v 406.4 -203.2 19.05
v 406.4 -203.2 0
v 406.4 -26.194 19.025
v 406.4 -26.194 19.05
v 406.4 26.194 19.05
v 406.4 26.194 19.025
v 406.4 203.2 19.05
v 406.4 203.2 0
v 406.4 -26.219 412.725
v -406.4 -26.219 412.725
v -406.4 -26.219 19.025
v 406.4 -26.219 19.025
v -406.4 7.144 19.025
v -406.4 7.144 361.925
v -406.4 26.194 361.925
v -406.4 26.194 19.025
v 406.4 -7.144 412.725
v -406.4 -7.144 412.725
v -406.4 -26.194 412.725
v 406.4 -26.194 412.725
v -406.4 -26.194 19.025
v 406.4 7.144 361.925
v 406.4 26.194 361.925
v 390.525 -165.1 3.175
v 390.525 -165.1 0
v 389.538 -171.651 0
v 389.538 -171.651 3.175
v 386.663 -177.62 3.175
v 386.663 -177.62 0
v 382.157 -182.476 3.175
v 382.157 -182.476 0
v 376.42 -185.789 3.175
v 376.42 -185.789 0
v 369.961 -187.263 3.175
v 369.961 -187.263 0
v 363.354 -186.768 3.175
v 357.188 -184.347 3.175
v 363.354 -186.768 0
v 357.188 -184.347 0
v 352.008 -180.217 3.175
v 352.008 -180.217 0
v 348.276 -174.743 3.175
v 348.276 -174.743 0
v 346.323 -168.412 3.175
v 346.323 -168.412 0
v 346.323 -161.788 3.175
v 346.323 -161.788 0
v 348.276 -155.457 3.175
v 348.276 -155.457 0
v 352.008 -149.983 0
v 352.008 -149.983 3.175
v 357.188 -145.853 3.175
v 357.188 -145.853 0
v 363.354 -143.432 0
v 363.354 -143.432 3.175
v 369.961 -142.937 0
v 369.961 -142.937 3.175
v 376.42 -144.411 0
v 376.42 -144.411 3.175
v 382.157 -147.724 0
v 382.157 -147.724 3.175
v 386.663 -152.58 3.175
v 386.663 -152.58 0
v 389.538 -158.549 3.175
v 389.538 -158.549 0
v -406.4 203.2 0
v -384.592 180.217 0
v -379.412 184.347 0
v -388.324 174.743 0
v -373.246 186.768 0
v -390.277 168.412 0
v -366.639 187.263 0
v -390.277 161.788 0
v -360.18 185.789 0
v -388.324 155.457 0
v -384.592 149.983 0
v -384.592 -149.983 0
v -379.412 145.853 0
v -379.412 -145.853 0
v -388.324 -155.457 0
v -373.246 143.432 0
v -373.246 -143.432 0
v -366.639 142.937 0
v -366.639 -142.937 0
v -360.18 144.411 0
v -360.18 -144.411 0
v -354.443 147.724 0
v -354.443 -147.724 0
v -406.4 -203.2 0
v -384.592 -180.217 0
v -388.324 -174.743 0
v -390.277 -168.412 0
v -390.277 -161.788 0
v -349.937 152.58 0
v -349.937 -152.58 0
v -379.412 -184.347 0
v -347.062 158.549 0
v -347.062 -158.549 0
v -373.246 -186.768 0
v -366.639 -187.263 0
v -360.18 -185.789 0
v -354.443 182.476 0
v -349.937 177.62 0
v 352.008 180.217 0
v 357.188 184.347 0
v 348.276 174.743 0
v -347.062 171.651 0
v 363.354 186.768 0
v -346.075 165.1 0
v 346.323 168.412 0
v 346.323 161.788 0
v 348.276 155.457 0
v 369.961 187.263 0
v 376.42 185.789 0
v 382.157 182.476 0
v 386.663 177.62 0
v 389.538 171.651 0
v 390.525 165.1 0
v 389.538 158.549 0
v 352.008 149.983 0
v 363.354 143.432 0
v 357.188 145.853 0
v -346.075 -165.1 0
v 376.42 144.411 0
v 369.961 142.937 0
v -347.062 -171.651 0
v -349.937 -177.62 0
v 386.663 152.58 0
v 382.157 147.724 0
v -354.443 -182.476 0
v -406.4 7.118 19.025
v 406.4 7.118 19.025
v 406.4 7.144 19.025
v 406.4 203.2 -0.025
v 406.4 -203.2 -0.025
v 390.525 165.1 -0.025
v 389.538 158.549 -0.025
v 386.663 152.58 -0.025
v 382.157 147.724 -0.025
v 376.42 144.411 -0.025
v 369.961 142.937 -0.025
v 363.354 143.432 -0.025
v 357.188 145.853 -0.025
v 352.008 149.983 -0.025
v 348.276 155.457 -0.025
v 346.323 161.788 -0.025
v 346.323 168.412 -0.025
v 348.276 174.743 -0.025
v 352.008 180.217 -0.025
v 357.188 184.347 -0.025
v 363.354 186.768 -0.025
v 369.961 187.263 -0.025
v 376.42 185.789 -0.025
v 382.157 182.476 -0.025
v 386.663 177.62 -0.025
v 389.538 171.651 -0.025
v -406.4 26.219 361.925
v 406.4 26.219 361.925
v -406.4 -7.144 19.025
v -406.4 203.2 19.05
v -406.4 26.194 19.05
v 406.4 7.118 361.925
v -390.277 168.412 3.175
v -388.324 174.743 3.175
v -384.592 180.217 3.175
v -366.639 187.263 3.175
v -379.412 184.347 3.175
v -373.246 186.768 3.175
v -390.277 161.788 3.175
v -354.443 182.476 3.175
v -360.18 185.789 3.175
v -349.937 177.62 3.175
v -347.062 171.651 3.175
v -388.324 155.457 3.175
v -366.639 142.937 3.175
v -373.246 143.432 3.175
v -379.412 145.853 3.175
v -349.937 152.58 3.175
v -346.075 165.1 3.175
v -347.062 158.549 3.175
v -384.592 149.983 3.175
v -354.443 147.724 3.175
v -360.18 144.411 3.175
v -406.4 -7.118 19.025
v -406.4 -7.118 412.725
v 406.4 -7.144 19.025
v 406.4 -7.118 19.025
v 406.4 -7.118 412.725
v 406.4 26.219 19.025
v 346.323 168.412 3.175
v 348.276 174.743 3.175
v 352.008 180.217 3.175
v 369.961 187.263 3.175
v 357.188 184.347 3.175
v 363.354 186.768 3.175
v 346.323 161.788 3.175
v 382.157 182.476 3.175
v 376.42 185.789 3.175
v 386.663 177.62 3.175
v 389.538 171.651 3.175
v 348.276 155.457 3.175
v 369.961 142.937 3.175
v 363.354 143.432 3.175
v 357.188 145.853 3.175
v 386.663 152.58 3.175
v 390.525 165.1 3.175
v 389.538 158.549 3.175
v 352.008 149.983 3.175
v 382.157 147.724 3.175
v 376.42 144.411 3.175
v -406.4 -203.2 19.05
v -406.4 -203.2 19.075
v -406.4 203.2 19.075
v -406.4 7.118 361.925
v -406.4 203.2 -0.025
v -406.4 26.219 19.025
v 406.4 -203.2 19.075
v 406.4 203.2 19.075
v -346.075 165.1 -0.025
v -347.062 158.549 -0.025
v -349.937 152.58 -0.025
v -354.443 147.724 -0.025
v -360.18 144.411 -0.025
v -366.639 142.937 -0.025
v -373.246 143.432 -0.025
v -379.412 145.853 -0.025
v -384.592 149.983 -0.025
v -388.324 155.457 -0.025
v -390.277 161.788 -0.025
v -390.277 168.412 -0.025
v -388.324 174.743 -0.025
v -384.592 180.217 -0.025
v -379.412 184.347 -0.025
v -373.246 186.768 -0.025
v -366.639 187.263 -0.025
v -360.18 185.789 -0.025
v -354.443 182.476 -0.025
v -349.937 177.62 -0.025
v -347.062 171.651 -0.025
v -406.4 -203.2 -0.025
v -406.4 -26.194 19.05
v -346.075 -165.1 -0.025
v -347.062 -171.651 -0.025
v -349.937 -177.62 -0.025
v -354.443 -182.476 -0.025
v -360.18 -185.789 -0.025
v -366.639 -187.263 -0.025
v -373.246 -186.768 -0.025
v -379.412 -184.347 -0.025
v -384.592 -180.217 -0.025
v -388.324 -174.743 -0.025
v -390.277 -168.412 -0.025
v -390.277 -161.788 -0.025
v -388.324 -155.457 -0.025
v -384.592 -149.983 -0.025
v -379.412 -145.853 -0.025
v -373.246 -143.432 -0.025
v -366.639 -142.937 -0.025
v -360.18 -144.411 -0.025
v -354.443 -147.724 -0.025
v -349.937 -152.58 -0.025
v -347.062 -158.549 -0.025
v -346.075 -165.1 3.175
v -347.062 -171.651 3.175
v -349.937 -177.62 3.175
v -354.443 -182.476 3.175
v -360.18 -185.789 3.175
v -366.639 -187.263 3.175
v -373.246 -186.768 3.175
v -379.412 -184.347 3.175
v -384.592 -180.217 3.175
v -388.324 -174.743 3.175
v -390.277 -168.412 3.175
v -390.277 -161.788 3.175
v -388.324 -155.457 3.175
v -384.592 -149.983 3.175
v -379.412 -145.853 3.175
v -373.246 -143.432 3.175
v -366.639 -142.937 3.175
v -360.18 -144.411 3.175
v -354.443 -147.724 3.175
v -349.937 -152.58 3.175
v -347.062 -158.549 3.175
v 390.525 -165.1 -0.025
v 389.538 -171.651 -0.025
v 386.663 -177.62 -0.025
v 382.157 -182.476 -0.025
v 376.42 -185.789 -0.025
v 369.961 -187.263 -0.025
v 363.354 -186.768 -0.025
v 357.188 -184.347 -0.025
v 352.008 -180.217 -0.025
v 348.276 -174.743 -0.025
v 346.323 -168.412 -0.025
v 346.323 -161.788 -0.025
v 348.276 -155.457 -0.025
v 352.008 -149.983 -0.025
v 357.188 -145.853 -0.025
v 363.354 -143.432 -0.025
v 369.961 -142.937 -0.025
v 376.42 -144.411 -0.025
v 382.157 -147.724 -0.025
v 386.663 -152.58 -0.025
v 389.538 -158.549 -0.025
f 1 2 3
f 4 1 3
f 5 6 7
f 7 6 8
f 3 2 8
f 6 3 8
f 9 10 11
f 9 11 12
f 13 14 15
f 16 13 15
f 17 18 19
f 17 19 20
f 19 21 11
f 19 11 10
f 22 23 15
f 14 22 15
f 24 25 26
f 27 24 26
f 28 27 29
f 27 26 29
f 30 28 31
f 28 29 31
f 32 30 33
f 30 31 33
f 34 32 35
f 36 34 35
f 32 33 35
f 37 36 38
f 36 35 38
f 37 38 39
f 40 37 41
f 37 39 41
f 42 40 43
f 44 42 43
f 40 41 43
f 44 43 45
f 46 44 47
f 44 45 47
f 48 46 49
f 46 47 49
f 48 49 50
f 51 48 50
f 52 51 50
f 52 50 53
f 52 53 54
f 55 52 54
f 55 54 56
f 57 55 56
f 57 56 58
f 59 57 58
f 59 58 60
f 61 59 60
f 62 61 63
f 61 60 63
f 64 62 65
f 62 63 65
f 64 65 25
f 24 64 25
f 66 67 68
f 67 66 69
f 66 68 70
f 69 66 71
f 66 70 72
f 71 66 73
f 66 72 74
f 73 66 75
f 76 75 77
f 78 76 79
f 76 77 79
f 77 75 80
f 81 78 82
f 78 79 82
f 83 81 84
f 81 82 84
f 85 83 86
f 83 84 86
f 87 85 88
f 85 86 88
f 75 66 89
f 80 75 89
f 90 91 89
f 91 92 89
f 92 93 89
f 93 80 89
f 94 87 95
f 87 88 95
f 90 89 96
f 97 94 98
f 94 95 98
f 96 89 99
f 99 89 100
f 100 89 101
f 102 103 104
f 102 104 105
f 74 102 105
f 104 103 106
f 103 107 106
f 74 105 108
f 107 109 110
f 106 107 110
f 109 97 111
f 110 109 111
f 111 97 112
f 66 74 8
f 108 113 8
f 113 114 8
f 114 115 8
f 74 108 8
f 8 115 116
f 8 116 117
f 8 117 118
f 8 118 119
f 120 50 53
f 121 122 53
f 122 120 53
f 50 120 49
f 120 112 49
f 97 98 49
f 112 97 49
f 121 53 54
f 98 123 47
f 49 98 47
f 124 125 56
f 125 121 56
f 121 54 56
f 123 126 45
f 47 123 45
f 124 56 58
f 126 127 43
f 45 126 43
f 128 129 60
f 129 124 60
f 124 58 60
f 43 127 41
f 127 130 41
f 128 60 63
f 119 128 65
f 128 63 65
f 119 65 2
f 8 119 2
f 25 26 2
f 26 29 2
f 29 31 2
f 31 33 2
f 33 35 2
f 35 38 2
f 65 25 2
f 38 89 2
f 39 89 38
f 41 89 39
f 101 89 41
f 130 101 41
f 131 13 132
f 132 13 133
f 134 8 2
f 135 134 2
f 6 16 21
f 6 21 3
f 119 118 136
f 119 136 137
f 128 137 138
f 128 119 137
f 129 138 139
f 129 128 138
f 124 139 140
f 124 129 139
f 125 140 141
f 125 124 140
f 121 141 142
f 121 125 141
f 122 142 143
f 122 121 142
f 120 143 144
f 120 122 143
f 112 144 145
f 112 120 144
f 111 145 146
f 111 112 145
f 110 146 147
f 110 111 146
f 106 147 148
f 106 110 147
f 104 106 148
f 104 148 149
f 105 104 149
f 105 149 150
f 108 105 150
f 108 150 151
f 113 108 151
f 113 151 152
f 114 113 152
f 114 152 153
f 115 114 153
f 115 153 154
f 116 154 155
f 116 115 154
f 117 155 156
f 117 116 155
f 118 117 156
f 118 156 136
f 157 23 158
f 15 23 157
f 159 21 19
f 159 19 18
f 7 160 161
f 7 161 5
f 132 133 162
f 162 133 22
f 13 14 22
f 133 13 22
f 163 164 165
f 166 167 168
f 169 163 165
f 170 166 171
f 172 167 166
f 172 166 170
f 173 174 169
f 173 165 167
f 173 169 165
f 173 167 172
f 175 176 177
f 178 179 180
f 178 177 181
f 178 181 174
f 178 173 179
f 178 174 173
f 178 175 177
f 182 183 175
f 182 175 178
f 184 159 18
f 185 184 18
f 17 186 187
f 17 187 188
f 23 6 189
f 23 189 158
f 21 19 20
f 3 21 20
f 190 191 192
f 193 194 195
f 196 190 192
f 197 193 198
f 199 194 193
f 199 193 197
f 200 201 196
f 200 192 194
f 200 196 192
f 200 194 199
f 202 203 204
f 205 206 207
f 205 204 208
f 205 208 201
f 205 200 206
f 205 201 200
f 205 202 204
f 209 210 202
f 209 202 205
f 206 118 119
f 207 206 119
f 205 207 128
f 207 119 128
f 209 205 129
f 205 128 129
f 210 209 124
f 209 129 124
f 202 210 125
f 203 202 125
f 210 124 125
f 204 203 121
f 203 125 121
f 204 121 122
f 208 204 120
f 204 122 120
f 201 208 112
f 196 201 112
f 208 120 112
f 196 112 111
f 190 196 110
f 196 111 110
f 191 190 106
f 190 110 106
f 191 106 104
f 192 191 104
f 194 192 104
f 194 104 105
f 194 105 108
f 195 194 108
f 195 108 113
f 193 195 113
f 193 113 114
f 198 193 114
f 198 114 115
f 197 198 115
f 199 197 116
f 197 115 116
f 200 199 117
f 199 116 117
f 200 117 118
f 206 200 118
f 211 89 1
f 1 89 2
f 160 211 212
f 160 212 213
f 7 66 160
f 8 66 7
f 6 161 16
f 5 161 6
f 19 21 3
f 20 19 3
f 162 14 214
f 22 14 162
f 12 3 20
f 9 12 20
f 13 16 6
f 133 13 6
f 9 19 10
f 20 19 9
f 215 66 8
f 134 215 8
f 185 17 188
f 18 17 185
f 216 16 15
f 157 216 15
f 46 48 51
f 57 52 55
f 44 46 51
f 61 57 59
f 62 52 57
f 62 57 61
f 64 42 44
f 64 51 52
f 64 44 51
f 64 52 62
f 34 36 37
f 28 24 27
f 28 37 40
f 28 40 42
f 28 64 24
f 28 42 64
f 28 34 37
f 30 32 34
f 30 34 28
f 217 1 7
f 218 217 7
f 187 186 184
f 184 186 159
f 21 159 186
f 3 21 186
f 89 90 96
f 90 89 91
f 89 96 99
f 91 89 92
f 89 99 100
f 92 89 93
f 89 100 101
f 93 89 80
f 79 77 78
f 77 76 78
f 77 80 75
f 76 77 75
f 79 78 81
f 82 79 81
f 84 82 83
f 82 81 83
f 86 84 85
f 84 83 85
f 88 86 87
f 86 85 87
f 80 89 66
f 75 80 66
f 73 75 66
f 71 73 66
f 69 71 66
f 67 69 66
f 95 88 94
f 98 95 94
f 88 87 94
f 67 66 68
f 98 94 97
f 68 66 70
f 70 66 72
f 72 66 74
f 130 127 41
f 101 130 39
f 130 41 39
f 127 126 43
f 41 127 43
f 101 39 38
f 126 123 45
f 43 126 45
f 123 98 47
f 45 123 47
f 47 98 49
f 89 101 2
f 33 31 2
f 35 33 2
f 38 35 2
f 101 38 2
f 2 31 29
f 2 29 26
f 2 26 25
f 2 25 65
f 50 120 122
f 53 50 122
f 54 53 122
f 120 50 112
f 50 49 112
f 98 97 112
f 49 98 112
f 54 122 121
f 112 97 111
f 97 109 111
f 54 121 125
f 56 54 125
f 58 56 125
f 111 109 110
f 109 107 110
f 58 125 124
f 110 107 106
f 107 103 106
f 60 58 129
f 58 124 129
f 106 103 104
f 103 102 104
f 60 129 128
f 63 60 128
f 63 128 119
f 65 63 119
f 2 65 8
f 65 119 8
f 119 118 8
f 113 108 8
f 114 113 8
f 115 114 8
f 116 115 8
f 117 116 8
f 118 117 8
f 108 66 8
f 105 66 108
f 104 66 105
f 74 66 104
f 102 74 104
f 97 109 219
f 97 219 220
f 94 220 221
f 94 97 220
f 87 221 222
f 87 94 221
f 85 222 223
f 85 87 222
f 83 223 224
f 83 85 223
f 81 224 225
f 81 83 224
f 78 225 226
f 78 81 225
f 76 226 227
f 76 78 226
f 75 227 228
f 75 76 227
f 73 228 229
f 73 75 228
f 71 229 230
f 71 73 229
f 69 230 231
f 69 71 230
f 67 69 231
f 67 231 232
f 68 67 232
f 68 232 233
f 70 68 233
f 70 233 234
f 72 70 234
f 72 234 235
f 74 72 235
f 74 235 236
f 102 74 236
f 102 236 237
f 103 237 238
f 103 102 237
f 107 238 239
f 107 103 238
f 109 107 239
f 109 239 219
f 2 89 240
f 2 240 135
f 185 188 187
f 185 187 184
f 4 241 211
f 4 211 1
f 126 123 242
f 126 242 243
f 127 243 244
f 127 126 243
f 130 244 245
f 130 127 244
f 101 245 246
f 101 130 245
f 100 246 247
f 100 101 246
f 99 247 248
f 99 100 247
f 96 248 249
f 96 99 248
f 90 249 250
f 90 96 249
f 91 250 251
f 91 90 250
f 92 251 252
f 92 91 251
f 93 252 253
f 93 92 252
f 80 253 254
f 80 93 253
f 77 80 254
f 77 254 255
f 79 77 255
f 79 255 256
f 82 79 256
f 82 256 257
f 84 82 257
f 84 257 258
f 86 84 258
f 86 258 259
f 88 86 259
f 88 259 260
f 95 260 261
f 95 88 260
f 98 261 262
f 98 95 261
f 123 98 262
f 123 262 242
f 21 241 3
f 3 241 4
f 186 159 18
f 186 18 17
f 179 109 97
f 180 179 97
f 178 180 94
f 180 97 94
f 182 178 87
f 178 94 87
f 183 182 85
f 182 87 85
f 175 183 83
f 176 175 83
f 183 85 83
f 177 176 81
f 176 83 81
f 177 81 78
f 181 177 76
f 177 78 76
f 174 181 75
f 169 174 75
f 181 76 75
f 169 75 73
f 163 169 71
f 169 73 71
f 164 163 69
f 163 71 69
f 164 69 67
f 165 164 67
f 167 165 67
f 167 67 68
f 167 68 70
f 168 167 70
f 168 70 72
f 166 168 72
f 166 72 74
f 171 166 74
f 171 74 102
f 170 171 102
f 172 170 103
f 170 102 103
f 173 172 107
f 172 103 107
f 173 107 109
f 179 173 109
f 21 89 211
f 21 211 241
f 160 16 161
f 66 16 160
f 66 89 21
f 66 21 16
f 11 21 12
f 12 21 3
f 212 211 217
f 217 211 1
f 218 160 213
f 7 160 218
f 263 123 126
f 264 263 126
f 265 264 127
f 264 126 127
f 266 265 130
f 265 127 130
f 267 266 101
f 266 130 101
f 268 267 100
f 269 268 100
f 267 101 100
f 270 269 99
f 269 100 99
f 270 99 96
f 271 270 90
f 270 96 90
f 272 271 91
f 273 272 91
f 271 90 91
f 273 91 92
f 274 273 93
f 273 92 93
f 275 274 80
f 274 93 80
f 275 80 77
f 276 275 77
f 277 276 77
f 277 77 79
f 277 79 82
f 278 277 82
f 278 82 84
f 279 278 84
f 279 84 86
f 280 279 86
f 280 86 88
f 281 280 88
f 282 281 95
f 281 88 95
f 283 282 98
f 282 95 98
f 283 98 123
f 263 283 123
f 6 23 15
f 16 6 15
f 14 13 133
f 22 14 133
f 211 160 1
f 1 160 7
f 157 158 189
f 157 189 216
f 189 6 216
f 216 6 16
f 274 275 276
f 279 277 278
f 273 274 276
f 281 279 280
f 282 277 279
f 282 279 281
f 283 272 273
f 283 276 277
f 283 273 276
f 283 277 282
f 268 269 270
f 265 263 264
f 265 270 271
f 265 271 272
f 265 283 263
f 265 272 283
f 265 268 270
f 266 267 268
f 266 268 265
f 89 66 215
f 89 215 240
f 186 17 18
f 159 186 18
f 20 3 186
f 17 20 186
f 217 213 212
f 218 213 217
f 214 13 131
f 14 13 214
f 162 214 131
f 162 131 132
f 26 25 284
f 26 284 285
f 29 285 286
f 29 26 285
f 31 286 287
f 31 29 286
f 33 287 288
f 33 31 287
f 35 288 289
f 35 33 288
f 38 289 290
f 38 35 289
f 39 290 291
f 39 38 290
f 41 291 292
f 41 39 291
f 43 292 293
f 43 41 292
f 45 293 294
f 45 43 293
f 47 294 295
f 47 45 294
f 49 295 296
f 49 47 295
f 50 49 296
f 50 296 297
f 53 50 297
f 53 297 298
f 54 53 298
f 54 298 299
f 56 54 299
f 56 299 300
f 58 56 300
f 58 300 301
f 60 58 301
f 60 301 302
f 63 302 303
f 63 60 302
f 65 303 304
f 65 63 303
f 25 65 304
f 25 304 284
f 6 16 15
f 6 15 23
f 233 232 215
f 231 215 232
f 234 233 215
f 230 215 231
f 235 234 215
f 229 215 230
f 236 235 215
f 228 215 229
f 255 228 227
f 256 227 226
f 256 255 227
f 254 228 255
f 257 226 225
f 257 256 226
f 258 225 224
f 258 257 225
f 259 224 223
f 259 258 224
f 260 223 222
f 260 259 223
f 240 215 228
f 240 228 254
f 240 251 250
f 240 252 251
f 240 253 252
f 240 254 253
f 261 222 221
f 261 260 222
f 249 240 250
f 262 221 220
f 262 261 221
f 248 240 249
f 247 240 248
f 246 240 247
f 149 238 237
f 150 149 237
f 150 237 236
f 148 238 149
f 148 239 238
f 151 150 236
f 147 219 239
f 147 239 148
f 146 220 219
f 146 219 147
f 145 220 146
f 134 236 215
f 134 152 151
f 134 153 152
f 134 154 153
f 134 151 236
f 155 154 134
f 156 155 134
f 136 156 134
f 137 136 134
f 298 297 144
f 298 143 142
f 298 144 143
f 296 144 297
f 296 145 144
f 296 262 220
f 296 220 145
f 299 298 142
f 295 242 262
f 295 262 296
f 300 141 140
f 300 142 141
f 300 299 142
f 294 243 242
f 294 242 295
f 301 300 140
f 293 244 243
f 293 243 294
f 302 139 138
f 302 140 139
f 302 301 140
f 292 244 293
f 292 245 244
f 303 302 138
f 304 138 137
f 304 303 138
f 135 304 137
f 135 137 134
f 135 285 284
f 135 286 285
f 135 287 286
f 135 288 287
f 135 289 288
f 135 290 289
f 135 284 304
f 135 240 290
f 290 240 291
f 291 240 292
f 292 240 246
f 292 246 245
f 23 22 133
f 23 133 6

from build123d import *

# Parameters (mm, degrees)
F0_W      = 812.8
F0_H      = 406.4
F1_DEPTH  = 19.05
F2_W      = 812.8
F2_H      = 52.3875
F3_DEPTH  = 0.0254
F4_W      = 812.8
F4_H      = 19.05
F5_DEPTH  = 393.7
F6_W      = 812.8
F6_H      = 50.8
F7_DEPTH  = 19.05
F8_W      = 812.8
F8_H      = 342.9
F9_DEPTH  = 0.0254
F10_W     = 812.8
F10_H     = 342.9
F11_DEPTH = 0.0254
F12_W     = 812.8
F12_H     = 393.7
F13_DEPTH = 0.0254
F14_W     = 812.8
F14_H     = 393.7
F15_DEPTH = 0.0254
F16_W     = 812.8
F16_H     = 406.4
F17_DEPTH = 0.0254
F18_R     = 22.225
F19_DEPTH = 3.175
F20_W     = 812.8
F20_H     = 406.4
F20_R     = 22.225
F21_DEPTH = 0.0254


with BuildPart() as f1:
    # F0 (on Top) → F1 (new body)
    with BuildSketch(Plane.XY):
        Rectangle(F0_W, F0_H)
    extrude(amount=F1_DEPTH)

    # F2 (on face) → F3 (cut)
    with BuildSketch(Plane.XY.offset(19.05)):
        Rectangle(F2_W, F2_H)
    extrude(amount=-F3_DEPTH, mode=Mode.SUBTRACT)

    # F18 (on face) → F19 (cut)
    with BuildSketch(Plane(origin=(0, 0, 0), x_dir=(1, 0, 0), z_dir=(0, 0, -1))):
        with Locations((-368.3, 165.1)):
            Circle(F18_R)
        with Locations((-368.3, -165.1)):
            Circle(F18_R)
        with Locations((368.3, -165.1)):
            Circle(F18_R)
        with Locations((368.3, 165.1)):
            Circle(F18_R)
    extrude(amount=-F19_DEPTH, mode=Mode.SUBTRACT)


with BuildPart() as f5:
    # F4 (on face) → F5 (new body)
    with BuildSketch(Plane.XY.offset(19.0246)):
        with Locations((0, -16.66875)):
            Rectangle(F4_W, F4_H)
        with Locations((0, 16.66875)):
            Rectangle(F4_W, F4_H)
    extrude(amount=F5_DEPTH)

    # F6 (on face) → F7 (cut, through all)
    with BuildSketch(Plane(origin=(0, 26.19375, 0), x_dir=(-1, 0, 0), z_dir=(0, 1, 0))):
        with Locations((0, 387.3246)):
            Rectangle(F6_W, F6_H)
    extrude(amount=-F7_DEPTH, mode=Mode.SUBTRACT)


with BuildPart() as f9:
    # F8 (on face) → F9 (new body)
    with BuildSketch(Plane(origin=(0, 26.19375, 0), x_dir=(-1, 0, 0), z_dir=(0, 1, 0))):
        with Locations((0, 190.4746)):
            Rectangle(F8_W, F8_H)
    extrude(amount=F9_DEPTH)


with BuildPart() as f11:
    # F10 (on face) → F11 (new body)
    with BuildSketch(Plane.XZ.offset(-7.14375)):
        with Locations((0, 190.4746)):
            Rectangle(F10_W, F10_H)
    extrude(amount=F11_DEPTH)


with BuildPart() as f13:
    # F12 (on face) → F13 (new body)
    with BuildSketch(Plane(origin=(0, -7.14375, 0), x_dir=(-1, 0, 0), z_dir=(0, 1, 0))):
        with Locations((0, 215.8746)):
            Rectangle(F12_W, F12_H)
    extrude(amount=F13_DEPTH)


with BuildPart() as f15:
    # F14 (on face) → F15 (new body)
    with BuildSketch(Plane.XZ.offset(26.19375)):
        with Locations((0, 215.8746)):
            Rectangle(F14_W, F14_H)
    extrude(amount=F15_DEPTH)


with BuildPart() as f17:
    # F16 (on face) → F17 (new body)
    with BuildSketch(Plane.XY.offset(19.05)):
        Rectangle(F16_W, F16_H)
    extrude(amount=F17_DEPTH)


with BuildPart() as f21:
    # F20 (on face) → F21 (new body)
    with BuildSketch(Plane(origin=(0, 0, 0), x_dir=(1, 0, 0), z_dir=(0, 0, -1))):
        Rectangle(F20_W, F20_H)
        with Locations((-368.3, -165.1)):
            Circle(F20_R, mode=Mode.SUBTRACT)
        with Locations((368.3, -165.1)):
            Circle(F20_R, mode=Mode.SUBTRACT)
        with Locations((-368.3, 165.1)):
            Circle(F20_R, mode=Mode.SUBTRACT)
        with Locations((368.3, 165.1)):
            Circle(F20_R, mode=Mode.SUBTRACT)
    extrude(amount=F21_DEPTH)


solid = Compound([f1.part, f5.part, f9.part, f11.part, f13.part, f15.part, f17.part, f21.part])
